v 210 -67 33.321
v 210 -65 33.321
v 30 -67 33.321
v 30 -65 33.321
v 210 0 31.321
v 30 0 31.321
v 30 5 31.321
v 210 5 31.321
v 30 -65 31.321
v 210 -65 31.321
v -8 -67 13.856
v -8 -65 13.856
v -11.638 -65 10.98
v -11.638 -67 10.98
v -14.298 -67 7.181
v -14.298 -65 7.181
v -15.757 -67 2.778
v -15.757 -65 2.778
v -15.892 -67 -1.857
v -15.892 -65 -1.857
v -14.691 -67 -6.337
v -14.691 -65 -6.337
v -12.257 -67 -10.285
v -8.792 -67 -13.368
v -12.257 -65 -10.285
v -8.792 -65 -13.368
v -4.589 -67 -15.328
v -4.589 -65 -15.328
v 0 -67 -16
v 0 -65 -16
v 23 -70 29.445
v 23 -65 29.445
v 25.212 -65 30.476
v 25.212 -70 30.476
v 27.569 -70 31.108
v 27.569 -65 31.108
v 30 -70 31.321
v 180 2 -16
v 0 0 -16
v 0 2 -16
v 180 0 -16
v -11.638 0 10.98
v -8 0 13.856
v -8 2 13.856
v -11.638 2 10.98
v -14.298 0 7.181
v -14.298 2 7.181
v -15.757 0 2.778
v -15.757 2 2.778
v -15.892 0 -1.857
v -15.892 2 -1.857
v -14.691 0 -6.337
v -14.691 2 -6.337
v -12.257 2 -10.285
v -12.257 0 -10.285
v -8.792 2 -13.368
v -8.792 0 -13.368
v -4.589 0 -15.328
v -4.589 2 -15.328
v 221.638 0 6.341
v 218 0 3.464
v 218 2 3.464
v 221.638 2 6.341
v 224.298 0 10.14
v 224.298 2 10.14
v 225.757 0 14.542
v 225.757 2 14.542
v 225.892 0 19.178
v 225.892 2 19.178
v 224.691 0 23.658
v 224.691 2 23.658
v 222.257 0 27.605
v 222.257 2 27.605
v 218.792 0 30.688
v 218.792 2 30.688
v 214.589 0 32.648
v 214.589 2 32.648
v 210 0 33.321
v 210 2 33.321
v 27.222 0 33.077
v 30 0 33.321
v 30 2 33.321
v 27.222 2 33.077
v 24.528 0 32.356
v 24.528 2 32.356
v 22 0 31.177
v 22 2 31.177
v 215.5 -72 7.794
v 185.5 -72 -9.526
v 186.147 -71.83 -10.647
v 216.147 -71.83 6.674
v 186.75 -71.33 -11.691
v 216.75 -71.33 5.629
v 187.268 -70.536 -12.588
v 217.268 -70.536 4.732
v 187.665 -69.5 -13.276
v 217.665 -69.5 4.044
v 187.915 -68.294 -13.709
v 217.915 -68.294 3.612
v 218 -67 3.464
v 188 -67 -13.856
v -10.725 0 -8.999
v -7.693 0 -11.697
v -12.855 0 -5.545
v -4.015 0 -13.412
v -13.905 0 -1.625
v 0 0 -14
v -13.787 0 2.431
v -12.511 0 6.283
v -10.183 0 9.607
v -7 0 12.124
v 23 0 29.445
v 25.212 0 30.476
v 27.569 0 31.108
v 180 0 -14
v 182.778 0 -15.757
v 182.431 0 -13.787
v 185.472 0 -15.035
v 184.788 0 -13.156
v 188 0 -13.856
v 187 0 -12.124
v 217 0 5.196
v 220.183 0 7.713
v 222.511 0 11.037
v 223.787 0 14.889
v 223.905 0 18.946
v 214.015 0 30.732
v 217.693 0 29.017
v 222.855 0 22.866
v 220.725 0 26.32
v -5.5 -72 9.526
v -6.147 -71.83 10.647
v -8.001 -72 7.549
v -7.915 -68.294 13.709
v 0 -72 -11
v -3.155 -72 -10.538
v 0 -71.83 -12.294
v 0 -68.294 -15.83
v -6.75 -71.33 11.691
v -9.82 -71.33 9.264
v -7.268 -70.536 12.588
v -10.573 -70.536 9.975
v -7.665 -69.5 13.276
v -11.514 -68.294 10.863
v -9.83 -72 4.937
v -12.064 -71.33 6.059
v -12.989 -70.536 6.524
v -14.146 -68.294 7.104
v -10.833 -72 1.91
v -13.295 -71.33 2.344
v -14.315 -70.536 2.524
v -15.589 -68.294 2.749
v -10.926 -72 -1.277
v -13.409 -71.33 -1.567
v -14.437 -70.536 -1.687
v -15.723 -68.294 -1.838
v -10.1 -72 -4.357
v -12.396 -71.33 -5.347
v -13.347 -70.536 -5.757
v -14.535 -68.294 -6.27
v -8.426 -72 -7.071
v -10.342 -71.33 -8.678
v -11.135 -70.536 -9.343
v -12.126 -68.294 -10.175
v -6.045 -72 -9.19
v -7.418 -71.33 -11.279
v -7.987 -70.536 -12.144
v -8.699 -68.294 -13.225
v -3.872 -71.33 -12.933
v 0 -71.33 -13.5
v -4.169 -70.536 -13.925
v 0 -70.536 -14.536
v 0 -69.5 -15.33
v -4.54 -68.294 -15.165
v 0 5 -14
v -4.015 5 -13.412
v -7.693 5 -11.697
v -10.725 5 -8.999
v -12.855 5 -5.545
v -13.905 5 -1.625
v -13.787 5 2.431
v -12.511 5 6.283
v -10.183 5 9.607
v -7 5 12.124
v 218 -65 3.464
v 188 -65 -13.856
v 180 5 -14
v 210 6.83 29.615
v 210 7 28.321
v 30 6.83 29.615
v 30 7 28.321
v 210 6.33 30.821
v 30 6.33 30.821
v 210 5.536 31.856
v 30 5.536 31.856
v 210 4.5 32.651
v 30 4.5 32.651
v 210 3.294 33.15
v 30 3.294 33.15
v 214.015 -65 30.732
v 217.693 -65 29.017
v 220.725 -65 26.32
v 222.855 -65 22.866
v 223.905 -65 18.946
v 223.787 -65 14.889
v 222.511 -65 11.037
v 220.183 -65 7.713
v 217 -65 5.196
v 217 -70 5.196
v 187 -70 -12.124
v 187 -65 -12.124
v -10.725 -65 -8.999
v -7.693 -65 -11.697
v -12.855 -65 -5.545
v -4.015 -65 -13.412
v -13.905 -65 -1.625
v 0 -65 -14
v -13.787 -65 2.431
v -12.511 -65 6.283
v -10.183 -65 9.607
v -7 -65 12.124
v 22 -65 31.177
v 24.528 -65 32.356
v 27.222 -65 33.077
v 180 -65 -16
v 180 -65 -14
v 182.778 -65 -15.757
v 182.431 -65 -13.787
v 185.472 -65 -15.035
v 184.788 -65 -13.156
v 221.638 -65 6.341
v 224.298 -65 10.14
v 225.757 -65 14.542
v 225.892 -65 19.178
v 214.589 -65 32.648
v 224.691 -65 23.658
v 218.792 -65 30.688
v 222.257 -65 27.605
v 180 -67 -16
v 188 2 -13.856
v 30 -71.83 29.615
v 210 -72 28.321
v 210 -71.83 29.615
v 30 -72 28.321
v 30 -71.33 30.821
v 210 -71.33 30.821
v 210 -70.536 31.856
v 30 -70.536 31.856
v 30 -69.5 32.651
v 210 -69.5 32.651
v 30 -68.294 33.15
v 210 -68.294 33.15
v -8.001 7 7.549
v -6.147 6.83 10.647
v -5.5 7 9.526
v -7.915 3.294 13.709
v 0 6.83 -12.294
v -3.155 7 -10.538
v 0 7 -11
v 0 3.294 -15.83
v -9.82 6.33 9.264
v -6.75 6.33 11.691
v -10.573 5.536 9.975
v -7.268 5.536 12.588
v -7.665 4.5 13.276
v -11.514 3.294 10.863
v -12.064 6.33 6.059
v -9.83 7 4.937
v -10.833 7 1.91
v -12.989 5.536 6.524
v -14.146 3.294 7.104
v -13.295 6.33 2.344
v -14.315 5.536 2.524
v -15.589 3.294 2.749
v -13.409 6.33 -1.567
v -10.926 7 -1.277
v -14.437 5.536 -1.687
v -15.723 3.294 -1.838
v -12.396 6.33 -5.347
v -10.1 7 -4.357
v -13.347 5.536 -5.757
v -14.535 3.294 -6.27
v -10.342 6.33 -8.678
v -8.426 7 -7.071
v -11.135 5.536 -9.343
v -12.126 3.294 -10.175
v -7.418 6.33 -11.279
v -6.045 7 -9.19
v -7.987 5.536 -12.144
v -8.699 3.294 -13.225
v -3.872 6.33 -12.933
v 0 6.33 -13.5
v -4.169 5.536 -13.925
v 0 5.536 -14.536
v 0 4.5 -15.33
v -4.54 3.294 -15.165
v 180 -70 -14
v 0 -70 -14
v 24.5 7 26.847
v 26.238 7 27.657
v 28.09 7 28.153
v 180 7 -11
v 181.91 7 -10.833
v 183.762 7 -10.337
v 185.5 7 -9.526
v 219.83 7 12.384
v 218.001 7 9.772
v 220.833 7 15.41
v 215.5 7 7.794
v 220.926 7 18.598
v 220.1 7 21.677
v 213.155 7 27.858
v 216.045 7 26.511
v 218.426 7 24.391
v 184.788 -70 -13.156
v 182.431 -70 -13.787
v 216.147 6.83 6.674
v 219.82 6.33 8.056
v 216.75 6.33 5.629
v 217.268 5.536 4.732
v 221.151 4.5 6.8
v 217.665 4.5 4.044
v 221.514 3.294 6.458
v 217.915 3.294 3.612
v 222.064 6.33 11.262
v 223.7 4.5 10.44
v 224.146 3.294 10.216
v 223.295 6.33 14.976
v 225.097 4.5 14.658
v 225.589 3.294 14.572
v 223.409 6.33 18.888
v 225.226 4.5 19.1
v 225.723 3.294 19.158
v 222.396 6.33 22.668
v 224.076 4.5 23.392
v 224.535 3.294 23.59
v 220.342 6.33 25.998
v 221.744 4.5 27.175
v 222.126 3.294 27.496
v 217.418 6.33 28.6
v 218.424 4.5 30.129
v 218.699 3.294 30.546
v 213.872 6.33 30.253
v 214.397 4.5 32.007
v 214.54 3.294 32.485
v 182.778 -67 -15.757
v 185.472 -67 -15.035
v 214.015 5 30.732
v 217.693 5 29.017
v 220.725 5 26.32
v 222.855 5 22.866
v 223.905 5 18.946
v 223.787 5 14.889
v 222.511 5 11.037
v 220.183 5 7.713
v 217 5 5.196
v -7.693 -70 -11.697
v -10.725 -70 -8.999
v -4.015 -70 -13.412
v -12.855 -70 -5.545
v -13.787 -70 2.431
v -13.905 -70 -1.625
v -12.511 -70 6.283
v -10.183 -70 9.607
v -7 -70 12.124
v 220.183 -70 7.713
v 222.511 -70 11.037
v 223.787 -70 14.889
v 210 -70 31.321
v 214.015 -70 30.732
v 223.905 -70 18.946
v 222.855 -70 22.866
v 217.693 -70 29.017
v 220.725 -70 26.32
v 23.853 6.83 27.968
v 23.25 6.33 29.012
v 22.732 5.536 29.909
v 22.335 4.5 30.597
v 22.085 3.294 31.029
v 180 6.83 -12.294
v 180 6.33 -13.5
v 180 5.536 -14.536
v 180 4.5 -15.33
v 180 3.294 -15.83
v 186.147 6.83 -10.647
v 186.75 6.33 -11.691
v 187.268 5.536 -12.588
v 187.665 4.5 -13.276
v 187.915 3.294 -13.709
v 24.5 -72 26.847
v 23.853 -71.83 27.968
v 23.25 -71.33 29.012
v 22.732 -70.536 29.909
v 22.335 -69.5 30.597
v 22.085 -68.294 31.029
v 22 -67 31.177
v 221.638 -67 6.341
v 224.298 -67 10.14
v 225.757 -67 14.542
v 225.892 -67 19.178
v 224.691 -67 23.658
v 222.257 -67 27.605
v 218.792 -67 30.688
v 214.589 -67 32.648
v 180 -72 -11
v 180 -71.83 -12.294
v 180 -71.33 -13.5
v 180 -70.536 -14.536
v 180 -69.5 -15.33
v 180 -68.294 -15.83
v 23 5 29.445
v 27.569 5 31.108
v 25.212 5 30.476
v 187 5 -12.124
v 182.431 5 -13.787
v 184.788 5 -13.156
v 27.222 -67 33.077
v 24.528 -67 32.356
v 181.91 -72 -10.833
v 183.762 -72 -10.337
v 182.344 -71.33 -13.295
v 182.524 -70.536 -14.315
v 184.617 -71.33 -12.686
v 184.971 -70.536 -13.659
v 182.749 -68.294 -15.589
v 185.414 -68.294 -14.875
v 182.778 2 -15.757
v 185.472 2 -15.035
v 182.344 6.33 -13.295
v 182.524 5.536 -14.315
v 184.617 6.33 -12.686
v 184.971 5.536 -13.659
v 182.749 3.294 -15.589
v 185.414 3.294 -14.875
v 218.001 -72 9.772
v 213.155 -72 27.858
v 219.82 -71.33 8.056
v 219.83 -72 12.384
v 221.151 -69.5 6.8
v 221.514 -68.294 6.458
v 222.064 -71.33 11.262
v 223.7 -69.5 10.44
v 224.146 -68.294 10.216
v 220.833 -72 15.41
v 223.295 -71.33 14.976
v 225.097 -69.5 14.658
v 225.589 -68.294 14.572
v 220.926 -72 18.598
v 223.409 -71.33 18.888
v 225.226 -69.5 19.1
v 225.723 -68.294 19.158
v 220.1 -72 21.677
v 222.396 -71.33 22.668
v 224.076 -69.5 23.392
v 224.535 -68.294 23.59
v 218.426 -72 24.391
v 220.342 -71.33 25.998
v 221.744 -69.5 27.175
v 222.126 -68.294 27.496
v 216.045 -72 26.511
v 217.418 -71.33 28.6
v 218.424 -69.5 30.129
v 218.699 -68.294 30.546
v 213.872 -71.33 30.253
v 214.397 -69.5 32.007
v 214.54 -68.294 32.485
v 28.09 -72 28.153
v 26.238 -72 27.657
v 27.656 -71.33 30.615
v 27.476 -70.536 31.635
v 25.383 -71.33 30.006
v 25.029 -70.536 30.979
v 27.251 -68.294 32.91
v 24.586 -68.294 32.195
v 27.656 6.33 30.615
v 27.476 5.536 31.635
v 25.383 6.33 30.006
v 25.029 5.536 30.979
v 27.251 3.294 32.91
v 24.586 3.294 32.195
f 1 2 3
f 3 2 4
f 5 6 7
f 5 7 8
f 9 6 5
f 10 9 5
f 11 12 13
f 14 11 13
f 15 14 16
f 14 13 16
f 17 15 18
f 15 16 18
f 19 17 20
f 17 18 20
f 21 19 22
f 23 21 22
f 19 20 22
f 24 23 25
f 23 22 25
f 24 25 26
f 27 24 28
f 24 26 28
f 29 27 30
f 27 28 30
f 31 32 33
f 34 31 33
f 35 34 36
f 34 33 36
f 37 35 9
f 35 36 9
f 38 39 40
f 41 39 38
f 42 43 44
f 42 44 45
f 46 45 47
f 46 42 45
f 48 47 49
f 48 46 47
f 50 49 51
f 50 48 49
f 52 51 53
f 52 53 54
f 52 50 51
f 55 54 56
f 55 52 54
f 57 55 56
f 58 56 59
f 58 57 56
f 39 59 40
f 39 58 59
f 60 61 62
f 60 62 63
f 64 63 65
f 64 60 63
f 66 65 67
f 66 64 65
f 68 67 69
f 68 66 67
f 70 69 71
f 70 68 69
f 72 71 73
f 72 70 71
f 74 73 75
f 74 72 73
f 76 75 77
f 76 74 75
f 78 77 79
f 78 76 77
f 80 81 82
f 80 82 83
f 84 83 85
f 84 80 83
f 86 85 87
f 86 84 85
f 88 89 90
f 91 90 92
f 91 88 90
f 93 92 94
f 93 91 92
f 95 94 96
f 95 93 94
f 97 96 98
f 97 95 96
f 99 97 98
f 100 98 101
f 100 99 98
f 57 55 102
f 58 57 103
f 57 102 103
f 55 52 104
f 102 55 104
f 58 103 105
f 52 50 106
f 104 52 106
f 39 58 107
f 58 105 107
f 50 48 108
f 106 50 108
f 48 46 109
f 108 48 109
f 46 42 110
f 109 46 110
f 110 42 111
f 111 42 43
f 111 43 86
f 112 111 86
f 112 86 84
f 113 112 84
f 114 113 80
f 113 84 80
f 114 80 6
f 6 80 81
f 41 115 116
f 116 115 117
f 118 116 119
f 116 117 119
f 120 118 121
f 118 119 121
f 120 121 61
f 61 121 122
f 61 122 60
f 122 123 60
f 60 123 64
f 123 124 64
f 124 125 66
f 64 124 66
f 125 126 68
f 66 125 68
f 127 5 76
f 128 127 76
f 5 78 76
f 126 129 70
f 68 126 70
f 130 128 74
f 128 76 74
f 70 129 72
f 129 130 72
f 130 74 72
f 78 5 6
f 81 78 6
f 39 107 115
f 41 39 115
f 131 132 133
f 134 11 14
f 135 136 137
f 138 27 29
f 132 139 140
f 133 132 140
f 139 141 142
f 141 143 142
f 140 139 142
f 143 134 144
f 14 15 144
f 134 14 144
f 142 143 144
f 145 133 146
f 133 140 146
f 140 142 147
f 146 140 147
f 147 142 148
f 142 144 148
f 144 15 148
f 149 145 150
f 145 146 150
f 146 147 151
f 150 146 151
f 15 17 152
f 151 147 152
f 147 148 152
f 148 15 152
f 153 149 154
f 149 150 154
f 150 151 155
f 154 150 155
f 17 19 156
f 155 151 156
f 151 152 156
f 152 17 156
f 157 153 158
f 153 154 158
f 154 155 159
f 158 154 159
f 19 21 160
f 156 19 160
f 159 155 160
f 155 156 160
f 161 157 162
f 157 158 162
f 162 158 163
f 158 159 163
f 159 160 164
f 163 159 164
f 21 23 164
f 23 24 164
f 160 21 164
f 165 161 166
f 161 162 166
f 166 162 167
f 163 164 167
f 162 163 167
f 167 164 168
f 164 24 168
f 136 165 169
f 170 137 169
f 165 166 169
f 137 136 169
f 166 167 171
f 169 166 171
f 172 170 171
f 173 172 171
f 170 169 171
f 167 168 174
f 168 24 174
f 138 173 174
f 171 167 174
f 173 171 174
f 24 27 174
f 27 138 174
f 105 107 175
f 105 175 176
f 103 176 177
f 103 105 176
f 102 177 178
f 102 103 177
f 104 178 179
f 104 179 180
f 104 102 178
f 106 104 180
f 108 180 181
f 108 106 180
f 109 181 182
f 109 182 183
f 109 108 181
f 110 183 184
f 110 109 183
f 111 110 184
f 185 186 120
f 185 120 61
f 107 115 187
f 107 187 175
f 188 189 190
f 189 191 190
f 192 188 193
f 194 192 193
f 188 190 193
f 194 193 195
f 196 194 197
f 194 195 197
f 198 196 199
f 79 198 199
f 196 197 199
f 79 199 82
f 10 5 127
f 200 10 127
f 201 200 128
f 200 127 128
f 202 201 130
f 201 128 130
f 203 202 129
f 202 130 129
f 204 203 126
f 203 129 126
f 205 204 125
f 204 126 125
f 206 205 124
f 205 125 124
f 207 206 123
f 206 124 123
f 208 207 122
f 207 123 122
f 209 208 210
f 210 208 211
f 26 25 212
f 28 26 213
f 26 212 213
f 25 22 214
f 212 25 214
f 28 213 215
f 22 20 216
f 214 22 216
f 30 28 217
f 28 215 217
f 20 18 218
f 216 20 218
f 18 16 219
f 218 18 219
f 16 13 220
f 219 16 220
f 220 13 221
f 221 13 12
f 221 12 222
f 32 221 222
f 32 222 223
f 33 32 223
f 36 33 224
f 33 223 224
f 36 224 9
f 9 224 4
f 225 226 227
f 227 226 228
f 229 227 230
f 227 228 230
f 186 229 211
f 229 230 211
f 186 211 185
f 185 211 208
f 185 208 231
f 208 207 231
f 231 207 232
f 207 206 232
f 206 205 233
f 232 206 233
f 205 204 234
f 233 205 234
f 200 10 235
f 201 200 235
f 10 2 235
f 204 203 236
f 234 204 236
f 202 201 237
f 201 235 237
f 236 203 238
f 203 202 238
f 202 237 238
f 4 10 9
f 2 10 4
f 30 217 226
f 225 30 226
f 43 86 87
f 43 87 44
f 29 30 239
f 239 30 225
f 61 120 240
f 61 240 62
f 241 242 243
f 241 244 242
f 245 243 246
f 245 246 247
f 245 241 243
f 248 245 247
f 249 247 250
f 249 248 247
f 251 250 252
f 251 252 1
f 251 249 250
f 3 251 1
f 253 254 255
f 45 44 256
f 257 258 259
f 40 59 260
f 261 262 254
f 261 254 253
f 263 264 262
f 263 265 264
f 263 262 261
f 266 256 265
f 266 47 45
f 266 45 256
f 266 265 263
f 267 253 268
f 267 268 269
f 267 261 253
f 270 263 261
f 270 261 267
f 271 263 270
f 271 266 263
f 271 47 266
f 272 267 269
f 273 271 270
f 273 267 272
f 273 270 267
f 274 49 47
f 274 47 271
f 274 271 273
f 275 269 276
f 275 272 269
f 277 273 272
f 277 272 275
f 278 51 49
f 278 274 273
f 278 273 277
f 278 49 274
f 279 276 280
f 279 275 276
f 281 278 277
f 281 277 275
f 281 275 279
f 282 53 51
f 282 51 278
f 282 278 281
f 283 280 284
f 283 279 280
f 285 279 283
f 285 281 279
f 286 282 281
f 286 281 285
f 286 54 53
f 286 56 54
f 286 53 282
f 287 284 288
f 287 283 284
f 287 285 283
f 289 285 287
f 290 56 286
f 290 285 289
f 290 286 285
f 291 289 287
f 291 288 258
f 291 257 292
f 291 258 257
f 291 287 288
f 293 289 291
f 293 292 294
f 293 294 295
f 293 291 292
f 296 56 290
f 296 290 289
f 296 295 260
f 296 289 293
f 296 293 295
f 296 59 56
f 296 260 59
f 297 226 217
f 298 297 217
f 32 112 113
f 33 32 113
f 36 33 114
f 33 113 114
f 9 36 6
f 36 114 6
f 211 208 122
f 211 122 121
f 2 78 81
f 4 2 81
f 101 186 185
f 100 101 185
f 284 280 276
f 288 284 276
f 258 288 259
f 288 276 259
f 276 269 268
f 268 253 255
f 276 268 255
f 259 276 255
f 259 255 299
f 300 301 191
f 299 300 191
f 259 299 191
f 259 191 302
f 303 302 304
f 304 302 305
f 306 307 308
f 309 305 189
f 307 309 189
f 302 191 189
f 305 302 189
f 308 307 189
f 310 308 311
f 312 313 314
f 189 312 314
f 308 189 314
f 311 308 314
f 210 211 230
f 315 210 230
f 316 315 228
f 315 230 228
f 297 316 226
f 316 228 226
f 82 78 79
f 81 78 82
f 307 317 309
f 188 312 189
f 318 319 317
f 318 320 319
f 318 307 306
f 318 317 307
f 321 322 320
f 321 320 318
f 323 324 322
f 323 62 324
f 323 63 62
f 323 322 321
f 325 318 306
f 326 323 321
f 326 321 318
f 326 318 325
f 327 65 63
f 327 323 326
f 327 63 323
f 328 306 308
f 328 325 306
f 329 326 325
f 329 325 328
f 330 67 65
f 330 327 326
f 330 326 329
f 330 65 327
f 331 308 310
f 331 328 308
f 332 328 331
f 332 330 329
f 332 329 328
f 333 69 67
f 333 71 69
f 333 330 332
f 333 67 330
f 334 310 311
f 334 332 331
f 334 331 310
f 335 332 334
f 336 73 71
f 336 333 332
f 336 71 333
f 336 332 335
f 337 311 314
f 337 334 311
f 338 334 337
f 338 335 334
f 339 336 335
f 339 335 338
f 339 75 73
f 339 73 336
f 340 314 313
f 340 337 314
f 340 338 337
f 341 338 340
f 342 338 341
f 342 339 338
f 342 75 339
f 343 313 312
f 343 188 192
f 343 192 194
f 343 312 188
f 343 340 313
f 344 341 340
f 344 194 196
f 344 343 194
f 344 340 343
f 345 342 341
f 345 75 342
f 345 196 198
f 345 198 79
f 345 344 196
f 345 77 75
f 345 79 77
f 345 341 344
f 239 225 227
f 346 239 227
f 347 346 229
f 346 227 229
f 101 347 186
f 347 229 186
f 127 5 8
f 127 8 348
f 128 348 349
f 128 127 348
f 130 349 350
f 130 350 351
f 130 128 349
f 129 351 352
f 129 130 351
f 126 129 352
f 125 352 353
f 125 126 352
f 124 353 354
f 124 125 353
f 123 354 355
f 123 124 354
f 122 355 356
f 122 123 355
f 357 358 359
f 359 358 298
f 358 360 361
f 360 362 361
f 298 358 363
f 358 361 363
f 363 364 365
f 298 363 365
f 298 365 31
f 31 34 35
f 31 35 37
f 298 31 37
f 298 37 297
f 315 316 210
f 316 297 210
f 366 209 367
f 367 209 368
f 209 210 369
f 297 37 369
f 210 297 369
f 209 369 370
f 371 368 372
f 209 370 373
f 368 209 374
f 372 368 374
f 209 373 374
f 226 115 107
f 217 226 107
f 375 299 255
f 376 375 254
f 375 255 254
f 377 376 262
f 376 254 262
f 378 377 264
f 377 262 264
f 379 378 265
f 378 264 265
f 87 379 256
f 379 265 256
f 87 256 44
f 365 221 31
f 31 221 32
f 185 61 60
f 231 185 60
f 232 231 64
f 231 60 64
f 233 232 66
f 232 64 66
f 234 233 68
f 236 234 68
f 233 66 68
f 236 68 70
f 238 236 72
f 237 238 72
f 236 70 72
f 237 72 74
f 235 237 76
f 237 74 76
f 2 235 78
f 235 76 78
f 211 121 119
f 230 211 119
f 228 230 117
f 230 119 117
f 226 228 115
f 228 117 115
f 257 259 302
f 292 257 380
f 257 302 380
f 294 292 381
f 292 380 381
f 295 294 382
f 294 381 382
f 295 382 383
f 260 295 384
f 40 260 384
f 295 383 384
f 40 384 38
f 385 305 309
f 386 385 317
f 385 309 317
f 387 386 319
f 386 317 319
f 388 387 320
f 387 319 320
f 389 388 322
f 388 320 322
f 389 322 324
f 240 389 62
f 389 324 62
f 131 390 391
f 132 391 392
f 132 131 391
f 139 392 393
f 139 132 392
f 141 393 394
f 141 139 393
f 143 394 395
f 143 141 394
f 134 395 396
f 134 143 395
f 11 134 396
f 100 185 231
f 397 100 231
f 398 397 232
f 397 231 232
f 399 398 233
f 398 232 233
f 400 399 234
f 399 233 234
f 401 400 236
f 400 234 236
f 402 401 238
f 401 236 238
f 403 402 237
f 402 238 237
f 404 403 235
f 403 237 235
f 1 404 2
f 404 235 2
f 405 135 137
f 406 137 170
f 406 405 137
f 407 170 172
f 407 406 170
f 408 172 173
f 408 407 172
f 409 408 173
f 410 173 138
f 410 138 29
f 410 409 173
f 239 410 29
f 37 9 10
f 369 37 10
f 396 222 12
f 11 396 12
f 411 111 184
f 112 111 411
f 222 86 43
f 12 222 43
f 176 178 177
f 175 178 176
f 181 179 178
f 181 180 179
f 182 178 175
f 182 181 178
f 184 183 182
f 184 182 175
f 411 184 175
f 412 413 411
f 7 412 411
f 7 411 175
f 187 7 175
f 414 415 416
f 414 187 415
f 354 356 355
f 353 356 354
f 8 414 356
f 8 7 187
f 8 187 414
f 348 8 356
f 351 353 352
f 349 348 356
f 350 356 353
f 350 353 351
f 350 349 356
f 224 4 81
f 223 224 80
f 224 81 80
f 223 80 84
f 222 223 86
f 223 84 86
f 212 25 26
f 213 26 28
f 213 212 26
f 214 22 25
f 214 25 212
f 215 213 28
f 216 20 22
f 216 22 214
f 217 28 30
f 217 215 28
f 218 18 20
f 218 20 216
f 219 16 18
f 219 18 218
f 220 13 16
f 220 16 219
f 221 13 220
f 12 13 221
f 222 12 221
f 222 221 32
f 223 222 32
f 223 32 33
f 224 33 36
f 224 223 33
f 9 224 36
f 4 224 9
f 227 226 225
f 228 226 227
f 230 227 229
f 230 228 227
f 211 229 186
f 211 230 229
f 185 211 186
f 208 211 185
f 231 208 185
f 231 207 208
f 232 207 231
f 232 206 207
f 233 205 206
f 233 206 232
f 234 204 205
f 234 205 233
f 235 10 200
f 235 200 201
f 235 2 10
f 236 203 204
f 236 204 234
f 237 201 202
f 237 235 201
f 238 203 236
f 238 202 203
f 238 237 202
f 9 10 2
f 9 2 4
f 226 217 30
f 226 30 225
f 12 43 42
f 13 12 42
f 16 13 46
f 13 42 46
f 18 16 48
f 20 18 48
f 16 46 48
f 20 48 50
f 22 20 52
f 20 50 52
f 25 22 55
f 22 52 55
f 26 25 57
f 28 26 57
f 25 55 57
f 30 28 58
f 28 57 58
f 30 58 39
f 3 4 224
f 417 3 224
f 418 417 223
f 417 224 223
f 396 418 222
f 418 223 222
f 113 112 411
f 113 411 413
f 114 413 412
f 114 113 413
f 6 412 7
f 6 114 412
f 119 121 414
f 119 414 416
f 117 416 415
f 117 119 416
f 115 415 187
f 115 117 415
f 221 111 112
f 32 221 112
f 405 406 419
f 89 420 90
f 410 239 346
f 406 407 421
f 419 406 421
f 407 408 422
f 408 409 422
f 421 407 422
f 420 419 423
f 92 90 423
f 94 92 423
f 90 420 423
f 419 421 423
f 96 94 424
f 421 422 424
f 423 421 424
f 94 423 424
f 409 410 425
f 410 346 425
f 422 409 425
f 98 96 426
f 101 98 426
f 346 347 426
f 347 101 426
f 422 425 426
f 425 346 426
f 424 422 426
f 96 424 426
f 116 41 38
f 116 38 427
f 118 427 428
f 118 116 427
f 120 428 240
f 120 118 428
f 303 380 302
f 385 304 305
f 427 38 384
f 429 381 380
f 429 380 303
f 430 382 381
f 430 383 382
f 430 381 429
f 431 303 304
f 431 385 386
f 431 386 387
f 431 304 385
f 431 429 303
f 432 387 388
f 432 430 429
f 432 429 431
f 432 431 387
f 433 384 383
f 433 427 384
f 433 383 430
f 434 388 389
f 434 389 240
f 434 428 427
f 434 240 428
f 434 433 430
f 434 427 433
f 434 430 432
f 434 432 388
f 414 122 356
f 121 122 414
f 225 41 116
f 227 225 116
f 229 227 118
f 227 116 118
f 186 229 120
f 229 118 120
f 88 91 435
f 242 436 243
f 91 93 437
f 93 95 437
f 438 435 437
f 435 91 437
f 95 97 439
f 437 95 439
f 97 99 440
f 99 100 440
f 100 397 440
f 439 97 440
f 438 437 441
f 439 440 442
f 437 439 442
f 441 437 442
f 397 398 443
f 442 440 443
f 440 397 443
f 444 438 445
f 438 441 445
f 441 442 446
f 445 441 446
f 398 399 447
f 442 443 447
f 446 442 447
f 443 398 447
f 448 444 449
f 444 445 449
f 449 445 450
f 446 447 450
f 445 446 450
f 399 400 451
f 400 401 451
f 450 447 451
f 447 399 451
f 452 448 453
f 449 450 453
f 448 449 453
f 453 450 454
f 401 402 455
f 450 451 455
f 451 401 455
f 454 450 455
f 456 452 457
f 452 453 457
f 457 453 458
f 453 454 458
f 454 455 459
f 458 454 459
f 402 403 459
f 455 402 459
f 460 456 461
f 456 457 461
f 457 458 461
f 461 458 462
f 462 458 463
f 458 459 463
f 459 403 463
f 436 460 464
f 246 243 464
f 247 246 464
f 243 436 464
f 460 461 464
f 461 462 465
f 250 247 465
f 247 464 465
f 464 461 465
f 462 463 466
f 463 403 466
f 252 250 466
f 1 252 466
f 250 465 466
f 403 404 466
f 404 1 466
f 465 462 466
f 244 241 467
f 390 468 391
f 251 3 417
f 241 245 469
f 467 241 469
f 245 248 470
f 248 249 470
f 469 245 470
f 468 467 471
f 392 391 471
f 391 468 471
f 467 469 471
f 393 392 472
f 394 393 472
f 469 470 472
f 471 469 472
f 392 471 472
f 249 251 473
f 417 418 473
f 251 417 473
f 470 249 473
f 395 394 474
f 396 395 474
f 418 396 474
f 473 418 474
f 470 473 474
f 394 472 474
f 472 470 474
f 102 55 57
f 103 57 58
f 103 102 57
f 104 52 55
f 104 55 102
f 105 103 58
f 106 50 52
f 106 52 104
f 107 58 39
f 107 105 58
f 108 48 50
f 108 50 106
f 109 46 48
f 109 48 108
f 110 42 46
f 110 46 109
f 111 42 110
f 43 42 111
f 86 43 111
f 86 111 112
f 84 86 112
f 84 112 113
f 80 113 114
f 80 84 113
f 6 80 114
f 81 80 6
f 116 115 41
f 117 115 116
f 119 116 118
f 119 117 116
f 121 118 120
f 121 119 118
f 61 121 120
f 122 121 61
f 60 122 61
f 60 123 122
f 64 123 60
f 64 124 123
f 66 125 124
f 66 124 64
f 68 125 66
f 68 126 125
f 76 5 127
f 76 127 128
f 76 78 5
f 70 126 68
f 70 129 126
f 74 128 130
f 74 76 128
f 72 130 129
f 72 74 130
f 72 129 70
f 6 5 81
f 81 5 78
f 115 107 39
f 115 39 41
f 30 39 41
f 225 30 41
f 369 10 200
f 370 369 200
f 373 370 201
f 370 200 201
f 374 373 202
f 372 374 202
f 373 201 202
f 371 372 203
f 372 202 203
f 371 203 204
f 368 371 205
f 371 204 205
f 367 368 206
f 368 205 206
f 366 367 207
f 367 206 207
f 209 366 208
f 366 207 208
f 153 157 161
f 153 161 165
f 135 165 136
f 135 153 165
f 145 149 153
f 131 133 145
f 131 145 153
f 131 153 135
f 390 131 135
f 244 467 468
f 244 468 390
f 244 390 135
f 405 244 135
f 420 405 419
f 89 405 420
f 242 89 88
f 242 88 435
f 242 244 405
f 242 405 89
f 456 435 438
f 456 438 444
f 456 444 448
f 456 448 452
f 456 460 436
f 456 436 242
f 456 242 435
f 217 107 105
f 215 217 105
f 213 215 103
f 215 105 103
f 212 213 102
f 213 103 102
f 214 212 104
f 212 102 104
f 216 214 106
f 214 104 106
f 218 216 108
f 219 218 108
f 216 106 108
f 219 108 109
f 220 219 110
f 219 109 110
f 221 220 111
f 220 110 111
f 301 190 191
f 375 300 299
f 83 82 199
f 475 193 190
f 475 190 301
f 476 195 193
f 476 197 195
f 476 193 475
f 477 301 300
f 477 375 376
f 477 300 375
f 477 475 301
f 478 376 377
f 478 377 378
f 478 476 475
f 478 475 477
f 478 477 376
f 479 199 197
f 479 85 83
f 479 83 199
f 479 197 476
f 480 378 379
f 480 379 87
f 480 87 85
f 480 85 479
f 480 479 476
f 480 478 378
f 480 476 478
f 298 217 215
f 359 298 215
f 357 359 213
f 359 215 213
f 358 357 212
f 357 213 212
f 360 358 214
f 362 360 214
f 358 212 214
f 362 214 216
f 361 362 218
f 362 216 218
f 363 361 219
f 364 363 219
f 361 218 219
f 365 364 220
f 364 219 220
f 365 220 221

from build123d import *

# Parameters (mm, degrees)
F2_DEPTH = 65
F4_DEPTH = 5
F6_DEPTH = 2
F7_R     = 5


with BuildPart() as f2:
    # F1 (on Front) → F2 (new body)
    with BuildSketch(Plane.XZ):
        with BuildLine():
            Line((210, 33.3205080757), (30, 33.3205080757))
            ThreePointArc((30, 33.3205080757), (25.8588952784, 32.7753212963), (22, 31.1769145362))
            Line((22, 31.1769145362), (-8, 13.8564064606))
            ThreePointArc((-8, 13.8564064606), (-15.4548132206, -4.1411047216), (0, -16))
            Line((0, -16), (180, -16))
            ThreePointArc((180, -16), (184.1411047216, -15.4548132206), (188, -13.8564064606))
            Line((188, -13.8564064606), (218, 3.4641016151))
            ThreePointArc((218, 3.4641016151), (225.4548132206, 21.4616127973), (210, 33.3205080757))
        make_face()
        with BuildLine():
            ThreePointArc((23, 29.4448637287), (26.3765333686, 30.8434696437), (30, 31.3205080757))
            Line((30, 31.3205080757), (210, 31.3205080757))
            ThreePointArc((210, 31.3205080757), (223.522961568, 20.9439747071), (217, 5.1961524227))
            Line((217, 5.1961524227), (187, -12.124355653))
            ThreePointArc((187, -12.124355653), (183.6234666314, -13.522961568), (180, -14))
            Line((180, -14), (0, -14))
            ThreePointArc((0, -14), (-13.522961568, -3.6234666314), (-7, 12.124355653))
            Line((-7, 12.124355653), (23, 29.4448637287))
        make_face(mode=Mode.SUBTRACT)
    extrude(amount=F2_DEPTH)


with BuildPart() as f4:
    # F3 (on face) → F4 (new body)
    with BuildSketch(Plane.XZ.offset(65)):
        with BuildLine():
            Line((22, 31.1769145362), (-8, 13.8564064606))
            ThreePointArc((-8, 13.8564064606), (-15.4548132206, -4.1411047216), (0, -16))
            Line((0, -16), (180, -16))
            ThreePointArc((180, -16), (184.1411047216, -15.4548132206), (188, -13.8564064606))
            Line((188, -13.8564064606), (218, 3.4641016151))
            ThreePointArc((218, 3.4641016151), (225.4548132206, 21.4616127973), (210, 33.3205080757))
            Line((210, 33.3205080757), (30, 33.3205080757))
            ThreePointArc((30, 33.3205080757), (25.8588952784, 32.7753212963), (22, 31.1769145362))
        make_face()
        with BuildLine():
            ThreePointArc((23, 29.4448637287), (26.3765333686, 30.8434696437), (30, 31.3205080757))
            Line((30, 31.3205080757), (210, 31.3205080757))
            ThreePointArc((210, 31.3205080757), (223.522961568, 20.9439747071), (217, 5.1961524227))
            Line((217, 5.1961524227), (187, -12.124355653))
            ThreePointArc((187, -12.124355653), (183.6234666314, -13.522961568), (180, -14))
            Line((180, -14), (0, -14))
            ThreePointArc((0, -14), (-13.522961568, -3.6234666314), (-7, 12.124355653))
            Line((-7, 12.124355653), (23, 29.4448637287))
        make_face(mode=Mode.SUBTRACT)
    extrude(amount=F4_DEPTH)

    # F5 (on face) → F6 (join)
    with BuildSketch(Plane.XZ.offset(70)):
        with BuildLine():
            ThreePointArc((30, 33.3205080757), (25.8588952784, 32.7753212963), (22, 31.1769145362))
            Line((22, 31.1769145362), (-8, 13.8564064606))
            ThreePointArc((-8, 13.8564064606), (-15.4548132206, -4.1411047216), (0, -16))
            Line((0, -16), (180, -16))
            ThreePointArc((180, -16), (184.1411047216, -15.4548132206), (188, -13.8564064606))
            Line((188, -13.8564064606), (218, 3.4641016151))
            ThreePointArc((218, 3.4641016151), (225.4548132206, 21.4616127973), (210, 33.3205080757))
            Line((210, 33.3205080757), (30, 33.3205080757))
        make_face()
        with BuildLine():
            ThreePointArc((0, -14), (-13.522961568, -3.6234666314), (-7, 12.124355653))
            Line((-7, 12.124355653), (23, 29.4448637287))
            ThreePointArc((23, 29.4448637287), (26.3765333686, 30.8434696437), (30, 31.3205080757))
            Line((30, 31.3205080757), (210, 31.3205080757))
            ThreePointArc((210, 31.3205080757), (223.522961568, 20.9439747071), (217, 5.1961524227))
            Line((217, 5.1961524227), (187, -12.124355653))
            ThreePointArc((187, -12.124355653), (183.6234666314, -13.522961568), (180, -14))
            Line((180, -14), (0, -14))
        make_face(mode=Mode.SUBTRACT)
        with BuildLine():
            Line((23, 29.4448637287), (-7, 12.124355653))
            ThreePointArc((-7, 12.124355653), (-13.522961568, -3.6234666314), (0, -14))
            Line((0, -14), (180, -14))
            ThreePointArc((180, -14), (183.6234666314, -13.522961568), (187, -12.124355653))
            Line((187, -12.124355653), (217, 5.1961524227))
            ThreePointArc((217, 5.1961524227), (223.522961568, 20.9439747071), (210, 31.3205080757))
            Line((210, 31.3205080757), (30, 31.3205080757))
            ThreePointArc((30, 31.3205080757), (26.3765333686, 30.8434696437), (23, 29.4448637287))
        make_face()
    extrude(amount=F6_DEPTH)

    # F7
    f7_edges = [f4.edges().sort_by_distance(p)[0] for p in [
        (120, -72, 33.320508),
        (25.858895, -72, 32.775321),
        (7, -72, 22.51666),
        (-15.454813, -72, -4.141105),
        (90, -72, -16),
        (184.141105, -72, -15.454813),
        (203, -72, -5.196152),
        (225.454813, -72, 21.461613),
    ]]
    fillet(f7_edges, radius=F7_R)


with BuildPart() as f9_1:
    # F9: instance of F4
    add(f4.part.mirror(Plane.XZ.offset(32.5)))


solid = Compound([f2.part, f4.part, f9_1.part])
